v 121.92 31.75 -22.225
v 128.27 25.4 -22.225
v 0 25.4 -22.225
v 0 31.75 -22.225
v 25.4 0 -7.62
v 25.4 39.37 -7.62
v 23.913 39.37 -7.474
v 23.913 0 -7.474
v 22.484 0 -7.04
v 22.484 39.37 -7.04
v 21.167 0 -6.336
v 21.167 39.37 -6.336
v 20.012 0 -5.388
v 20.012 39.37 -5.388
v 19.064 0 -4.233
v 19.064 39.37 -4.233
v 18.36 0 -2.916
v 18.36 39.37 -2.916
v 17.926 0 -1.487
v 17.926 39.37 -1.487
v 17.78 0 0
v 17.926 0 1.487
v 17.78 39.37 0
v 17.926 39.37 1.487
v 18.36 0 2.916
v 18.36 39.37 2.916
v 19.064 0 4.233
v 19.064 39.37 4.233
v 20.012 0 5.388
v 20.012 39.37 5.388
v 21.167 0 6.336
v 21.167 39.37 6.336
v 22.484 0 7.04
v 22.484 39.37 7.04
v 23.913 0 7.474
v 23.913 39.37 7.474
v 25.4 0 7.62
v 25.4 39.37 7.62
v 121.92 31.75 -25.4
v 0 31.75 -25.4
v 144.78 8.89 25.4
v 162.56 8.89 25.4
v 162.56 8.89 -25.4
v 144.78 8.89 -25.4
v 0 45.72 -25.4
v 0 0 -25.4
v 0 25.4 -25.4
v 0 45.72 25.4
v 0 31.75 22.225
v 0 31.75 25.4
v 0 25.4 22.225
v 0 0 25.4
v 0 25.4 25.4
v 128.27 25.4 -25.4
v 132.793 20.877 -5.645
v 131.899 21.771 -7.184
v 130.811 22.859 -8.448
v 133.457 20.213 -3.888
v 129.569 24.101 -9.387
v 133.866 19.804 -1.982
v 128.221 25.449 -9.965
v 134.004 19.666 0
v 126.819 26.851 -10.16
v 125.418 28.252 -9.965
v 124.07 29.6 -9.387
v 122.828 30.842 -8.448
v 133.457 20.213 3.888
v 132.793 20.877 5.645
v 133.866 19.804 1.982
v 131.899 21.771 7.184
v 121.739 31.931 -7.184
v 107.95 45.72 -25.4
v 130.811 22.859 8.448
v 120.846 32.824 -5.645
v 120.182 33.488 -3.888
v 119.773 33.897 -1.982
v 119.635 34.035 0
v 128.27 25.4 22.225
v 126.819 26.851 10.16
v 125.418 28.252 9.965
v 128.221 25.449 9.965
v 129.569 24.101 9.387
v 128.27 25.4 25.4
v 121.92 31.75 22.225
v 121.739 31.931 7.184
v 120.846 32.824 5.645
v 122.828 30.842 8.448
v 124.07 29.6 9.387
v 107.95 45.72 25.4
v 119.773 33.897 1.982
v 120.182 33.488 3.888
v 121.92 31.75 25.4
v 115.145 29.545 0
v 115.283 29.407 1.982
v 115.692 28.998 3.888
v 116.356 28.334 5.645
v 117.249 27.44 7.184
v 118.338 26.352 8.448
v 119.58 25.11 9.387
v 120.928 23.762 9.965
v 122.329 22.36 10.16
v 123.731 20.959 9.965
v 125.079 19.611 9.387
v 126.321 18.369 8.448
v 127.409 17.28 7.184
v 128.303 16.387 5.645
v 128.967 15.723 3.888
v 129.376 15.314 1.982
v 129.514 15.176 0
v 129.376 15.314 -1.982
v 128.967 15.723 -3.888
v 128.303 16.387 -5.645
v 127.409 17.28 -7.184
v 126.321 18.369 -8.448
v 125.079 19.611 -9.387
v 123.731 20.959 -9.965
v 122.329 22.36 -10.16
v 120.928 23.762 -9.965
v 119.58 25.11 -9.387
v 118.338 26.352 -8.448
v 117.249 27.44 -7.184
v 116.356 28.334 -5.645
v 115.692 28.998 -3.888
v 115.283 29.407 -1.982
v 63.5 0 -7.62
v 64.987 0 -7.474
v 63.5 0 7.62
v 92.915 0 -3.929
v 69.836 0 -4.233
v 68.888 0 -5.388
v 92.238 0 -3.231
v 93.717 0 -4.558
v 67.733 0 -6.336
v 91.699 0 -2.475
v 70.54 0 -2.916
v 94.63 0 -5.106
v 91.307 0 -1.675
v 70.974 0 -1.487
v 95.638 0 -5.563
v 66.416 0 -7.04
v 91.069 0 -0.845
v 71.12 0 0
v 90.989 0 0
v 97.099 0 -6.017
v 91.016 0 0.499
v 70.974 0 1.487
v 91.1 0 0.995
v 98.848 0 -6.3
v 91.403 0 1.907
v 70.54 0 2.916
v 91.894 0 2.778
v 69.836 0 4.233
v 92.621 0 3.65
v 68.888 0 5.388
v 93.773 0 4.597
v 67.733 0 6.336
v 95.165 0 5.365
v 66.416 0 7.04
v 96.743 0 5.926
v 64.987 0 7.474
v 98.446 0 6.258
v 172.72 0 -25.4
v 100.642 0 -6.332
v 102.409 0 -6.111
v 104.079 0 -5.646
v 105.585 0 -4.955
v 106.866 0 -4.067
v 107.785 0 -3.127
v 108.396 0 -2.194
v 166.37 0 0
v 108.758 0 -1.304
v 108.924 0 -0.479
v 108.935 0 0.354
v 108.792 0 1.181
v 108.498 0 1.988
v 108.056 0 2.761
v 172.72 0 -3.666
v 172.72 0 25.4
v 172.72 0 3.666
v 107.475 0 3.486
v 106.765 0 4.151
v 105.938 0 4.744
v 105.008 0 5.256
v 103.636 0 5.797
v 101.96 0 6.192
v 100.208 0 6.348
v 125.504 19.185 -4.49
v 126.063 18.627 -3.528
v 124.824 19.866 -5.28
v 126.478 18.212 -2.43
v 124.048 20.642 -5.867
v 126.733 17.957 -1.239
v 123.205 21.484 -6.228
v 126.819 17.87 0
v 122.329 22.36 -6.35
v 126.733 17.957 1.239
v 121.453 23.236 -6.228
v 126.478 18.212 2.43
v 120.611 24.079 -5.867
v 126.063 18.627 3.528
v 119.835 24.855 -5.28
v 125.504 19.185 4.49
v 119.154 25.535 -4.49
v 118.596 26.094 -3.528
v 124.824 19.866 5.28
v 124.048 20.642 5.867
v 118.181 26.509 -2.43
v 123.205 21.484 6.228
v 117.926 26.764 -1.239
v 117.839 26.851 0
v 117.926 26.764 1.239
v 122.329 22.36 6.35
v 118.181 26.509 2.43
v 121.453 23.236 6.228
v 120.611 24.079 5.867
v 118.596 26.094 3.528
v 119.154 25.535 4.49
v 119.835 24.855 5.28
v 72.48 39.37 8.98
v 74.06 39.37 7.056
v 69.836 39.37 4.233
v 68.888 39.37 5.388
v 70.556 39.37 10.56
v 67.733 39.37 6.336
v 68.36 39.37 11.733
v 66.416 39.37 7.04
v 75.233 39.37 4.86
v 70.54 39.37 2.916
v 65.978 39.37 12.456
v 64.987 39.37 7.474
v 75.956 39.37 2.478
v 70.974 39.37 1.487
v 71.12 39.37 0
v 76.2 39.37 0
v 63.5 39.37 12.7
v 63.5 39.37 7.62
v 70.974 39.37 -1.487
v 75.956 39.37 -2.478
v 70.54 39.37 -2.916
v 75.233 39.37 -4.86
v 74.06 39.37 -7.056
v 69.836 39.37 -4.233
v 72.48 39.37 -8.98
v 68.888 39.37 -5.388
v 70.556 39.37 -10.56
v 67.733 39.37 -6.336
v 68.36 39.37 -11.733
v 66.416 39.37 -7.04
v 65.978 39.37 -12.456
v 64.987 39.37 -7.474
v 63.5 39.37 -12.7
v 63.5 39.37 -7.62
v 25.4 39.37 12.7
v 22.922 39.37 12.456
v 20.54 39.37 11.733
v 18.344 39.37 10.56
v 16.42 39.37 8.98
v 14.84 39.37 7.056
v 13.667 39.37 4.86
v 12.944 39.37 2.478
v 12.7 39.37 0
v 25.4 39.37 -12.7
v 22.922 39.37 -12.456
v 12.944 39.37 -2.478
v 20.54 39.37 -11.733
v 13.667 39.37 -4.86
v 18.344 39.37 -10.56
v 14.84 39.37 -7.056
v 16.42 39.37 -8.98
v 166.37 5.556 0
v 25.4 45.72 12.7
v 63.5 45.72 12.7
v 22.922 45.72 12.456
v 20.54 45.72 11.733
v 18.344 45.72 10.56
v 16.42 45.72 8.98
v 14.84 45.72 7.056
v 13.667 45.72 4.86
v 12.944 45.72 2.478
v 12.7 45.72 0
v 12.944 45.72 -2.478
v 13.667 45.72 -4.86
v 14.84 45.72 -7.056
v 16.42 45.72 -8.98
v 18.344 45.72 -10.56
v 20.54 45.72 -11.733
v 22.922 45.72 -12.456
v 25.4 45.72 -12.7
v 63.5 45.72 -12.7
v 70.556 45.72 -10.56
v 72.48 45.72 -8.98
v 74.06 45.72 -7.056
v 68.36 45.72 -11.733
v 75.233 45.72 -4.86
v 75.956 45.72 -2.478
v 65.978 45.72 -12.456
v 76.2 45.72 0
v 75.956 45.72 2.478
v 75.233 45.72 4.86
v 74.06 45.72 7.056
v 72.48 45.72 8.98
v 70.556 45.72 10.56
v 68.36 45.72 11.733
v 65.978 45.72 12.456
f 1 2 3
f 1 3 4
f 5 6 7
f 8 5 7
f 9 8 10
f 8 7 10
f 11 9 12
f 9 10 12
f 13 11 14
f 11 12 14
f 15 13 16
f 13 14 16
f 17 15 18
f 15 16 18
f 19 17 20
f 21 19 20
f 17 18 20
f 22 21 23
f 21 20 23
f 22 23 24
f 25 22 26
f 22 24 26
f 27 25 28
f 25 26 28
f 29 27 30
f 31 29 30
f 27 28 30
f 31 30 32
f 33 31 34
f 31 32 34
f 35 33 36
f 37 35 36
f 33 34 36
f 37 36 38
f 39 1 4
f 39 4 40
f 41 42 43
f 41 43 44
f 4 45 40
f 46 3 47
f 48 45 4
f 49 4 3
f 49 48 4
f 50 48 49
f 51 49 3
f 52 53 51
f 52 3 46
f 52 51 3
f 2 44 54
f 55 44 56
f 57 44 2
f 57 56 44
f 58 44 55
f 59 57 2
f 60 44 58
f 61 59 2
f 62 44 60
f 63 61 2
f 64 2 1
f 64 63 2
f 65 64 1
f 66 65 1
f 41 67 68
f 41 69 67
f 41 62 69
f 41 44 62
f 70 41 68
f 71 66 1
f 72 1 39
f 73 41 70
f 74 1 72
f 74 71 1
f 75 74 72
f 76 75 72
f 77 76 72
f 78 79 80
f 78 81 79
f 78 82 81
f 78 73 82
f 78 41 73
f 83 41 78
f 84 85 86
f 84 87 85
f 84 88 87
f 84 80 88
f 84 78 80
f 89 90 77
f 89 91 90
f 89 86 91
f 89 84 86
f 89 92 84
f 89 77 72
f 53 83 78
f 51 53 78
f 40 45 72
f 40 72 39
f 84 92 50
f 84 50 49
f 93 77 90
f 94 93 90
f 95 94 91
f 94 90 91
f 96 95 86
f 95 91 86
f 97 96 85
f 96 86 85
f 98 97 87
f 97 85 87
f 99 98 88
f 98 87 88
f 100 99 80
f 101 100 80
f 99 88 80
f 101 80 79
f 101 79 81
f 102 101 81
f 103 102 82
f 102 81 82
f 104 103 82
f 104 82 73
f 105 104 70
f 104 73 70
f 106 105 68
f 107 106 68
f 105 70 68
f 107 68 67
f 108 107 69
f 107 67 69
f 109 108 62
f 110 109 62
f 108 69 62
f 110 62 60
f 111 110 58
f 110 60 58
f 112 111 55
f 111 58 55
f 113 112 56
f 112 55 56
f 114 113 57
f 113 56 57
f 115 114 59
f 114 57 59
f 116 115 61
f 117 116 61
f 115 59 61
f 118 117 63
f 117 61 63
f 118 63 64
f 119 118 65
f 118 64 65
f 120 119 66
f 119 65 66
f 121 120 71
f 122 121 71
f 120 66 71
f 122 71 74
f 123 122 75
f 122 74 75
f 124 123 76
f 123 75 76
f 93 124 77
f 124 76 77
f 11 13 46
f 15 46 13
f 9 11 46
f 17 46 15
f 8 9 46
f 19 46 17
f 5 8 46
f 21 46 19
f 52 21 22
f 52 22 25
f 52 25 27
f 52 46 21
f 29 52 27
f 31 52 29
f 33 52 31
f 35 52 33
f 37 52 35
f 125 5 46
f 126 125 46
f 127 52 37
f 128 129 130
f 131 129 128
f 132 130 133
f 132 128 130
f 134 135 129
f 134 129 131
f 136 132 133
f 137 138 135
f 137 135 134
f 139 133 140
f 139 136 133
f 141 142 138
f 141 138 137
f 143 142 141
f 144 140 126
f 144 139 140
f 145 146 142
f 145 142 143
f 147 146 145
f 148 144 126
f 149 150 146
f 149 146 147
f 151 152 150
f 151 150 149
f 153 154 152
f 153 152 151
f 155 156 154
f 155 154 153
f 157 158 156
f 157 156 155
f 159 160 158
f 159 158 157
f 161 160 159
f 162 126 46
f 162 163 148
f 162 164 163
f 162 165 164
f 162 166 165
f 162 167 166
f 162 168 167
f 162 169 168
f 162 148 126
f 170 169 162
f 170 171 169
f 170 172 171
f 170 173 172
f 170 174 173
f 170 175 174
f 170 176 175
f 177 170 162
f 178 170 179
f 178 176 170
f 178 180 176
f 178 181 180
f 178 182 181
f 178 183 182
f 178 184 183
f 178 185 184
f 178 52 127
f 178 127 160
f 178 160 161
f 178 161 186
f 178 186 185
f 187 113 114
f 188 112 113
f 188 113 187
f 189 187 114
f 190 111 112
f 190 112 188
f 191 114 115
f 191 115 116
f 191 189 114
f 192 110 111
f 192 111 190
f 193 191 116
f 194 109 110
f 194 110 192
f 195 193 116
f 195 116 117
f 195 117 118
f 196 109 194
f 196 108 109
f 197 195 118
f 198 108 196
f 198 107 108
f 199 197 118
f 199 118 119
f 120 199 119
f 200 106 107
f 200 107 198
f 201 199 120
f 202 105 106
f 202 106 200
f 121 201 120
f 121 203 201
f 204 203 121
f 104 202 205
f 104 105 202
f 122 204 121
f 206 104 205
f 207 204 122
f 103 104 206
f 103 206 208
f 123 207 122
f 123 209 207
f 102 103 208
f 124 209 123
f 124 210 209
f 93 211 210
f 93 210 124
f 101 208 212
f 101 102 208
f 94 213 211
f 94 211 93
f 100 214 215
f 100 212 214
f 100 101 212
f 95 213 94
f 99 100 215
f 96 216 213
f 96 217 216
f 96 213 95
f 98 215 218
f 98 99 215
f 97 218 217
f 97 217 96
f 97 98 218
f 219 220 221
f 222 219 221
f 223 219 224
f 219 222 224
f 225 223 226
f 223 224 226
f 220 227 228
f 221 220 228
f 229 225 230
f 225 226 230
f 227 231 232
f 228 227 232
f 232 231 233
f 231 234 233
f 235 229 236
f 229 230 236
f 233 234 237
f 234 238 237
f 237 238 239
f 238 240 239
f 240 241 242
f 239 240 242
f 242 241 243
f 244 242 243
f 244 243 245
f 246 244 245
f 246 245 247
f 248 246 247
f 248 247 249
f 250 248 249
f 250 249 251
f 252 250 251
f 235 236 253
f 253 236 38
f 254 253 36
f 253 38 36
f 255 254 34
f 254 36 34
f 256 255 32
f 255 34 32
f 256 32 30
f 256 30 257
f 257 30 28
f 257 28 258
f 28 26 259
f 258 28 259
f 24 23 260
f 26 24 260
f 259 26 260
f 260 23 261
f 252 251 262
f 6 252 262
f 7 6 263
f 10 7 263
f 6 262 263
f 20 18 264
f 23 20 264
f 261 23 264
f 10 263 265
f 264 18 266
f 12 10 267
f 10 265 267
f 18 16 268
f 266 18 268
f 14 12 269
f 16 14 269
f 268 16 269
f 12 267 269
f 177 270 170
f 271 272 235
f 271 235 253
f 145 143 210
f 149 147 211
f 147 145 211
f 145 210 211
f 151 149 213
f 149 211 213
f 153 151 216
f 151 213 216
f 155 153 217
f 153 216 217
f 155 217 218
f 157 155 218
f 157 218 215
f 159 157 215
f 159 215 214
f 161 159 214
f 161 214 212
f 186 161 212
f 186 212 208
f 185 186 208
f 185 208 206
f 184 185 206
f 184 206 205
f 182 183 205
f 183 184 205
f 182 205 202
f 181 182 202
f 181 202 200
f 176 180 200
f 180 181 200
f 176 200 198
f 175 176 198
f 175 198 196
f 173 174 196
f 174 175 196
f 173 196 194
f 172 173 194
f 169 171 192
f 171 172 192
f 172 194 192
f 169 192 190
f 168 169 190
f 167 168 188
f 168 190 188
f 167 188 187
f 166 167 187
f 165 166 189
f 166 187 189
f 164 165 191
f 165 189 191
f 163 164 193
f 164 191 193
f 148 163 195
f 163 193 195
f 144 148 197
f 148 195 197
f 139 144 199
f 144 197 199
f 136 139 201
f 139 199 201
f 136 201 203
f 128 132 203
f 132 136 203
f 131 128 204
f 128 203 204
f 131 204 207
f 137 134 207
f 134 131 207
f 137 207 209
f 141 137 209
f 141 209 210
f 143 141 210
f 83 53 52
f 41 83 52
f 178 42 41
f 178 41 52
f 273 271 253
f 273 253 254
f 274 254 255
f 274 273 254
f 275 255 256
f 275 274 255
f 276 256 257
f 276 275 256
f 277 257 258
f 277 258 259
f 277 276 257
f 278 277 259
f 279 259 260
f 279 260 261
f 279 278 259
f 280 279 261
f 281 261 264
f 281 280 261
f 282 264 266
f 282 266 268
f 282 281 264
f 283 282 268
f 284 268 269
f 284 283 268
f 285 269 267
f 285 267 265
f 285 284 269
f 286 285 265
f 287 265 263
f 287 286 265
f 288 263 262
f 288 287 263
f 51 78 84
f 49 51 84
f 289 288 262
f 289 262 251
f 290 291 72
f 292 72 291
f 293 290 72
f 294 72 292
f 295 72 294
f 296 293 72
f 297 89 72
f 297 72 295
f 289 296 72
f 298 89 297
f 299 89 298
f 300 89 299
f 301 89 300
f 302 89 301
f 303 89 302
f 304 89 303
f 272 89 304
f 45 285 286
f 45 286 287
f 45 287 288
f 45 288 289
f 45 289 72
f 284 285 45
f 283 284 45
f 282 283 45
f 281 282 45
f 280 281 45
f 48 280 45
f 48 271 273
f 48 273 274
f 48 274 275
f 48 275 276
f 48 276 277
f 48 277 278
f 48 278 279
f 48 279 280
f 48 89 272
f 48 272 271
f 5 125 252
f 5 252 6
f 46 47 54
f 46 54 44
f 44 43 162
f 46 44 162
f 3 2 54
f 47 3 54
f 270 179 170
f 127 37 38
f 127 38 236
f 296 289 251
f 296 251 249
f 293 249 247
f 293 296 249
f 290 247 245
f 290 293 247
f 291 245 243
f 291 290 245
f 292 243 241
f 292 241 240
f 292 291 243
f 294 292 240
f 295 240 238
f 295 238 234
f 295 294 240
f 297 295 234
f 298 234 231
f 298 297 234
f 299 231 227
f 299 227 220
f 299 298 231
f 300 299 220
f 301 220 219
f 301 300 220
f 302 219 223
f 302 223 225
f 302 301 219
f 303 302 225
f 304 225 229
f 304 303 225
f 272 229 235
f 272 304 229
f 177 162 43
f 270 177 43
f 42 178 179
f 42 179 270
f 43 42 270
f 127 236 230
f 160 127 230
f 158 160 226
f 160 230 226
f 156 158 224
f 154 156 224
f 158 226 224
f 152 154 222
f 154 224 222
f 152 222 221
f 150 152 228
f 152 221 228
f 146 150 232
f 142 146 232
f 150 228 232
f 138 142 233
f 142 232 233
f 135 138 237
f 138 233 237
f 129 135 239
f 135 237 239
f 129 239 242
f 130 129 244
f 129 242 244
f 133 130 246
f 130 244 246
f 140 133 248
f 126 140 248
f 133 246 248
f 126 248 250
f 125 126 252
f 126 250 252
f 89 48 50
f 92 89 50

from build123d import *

# Parameters (mm, degrees)
BOSS_EXTRUDE1_DEPTH = 25.4
SKETCH2_R           = 6.35
CUT_EXTRUDE1_DEPTH  = 126.469958357
SKETCH3_R           = 10.16
CUT_EXTRUDE2_DEPTH  = 6.35
CUT_EXTRUDE3_DEPTH  = 179.420310783
SKETCH6_W           = 3.175
SKETCH6_H           = 6.35
CUT_EXTRUDE4_DEPTH  = 181.46516783
CUT_EXTRUDE5_DEPTH  = 6.35
CUT_EXTRUDE6_DEPTH  = 179.961882254


with BuildPart() as part:
    # Sketch1 → Boss-Extrude1 (new, symmetric)
    with BuildSketch(Plane.XY):
        Polygon((0, 0), (172.72, 0), (162.56, 8.89), (144.78, 8.89), (107.95, 45.72), (0, 45.72), align=None)
    extrude(amount=BOSS_EXTRUDE1_DEPTH, both=True)

    # Sketch2 → Cut-Extrude1 (cut, through all)
    with BuildSketch(Plane(origin=(76.835, 76.835, 0), x_dir=(0, 0, -1), z_dir=(0.7071067811865482, 0.7071067811865468, 0))):
        with Locations(Location((0, -70.688740495, 0), (0, 0, 90))):
            Circle(SKETCH2_R)
    extrude(amount=-CUT_EXTRUDE1_DEPTH, mode=Mode.SUBTRACT)

    # Sketch3 → Cut-Extrude2 (cut)
    with BuildSketch(Plane(origin=(76.835, 76.835, 0), x_dir=(0, 0, -1), z_dir=(0.7071067811865482, 0.7071067811865468, 0))):
        with Locations(Location((0, -70.688740495, 0), (0, 0, 90))):
            Circle(SKETCH3_R)
    extrude(amount=-CUT_EXTRUDE2_DEPTH, mode=Mode.SUBTRACT)

    # Sketch5 → Cut-Extrude3 (cut, through all)
    with BuildSketch(Plane(origin=(0, 8.89, 0), x_dir=(1, 0, 0), z_dir=(0, 1, 0))):
        Polygon((166.37, 0), (177.602369567, 6.485011593), (177.602369567, -6.485011593), align=None)
    extrude(amount=-CUT_EXTRUDE3_DEPTH, mode=Mode.SUBTRACT)

    # Sketch6 → Cut-Extrude4 (cut, through all)
    with BuildSketch(Plane(origin=(0, 0, 0), x_dir=(0, 0, -1), z_dir=(1, 0, 0))):
        with Locations((-23.8125, 28.575)):
            Rectangle(SKETCH6_W, SKETCH6_H)
        with Locations((23.8125, 28.575)):
            Rectangle(SKETCH6_W, SKETCH6_H)
    extrude(amount=CUT_EXTRUDE4_DEPTH, mode=Mode.SUBTRACT)

    # Sketch7 → Cut-Extrude5 (cut)
    with BuildSketch(Plane(origin=(0, 45.72, 0), x_dir=(1, 0, 0), z_dir=(0, 1, 0))):
        with BuildLine():
            Line((25.4, 12.7), (63.5, 12.7))
            ThreePointArc((63.5, 12.7), (76.2, 0), (63.5, -12.7))
            Line((63.5, -12.7), (25.4, -12.7))
            ThreePointArc((25.4, -12.7), (12.7, 0), (25.4, 12.7))
        make_face()
    extrude(amount=-CUT_EXTRUDE5_DEPTH, mode=Mode.SUBTRACT)

    # Sketch8 → Cut-Extrude6 (cut, through all)
    with BuildSketch(Plane(origin=(0, 39.37, 0), x_dir=(1, 0, 0), z_dir=(0, 1, 0))):
        with BuildLine():
            Line((25.4, -7.62), (63.5, -7.62))
            ThreePointArc((63.5, -7.62), (71.12, 0), (63.5, 7.62))
            Line((63.5, 7.62), (25.4, 7.62))
            ThreePointArc((25.4, 7.62), (17.78, 0), (25.4, -7.62))
        make_face()
    extrude(amount=-CUT_EXTRUDE6_DEPTH, mode=Mode.SUBTRACT)


solid = part.part
